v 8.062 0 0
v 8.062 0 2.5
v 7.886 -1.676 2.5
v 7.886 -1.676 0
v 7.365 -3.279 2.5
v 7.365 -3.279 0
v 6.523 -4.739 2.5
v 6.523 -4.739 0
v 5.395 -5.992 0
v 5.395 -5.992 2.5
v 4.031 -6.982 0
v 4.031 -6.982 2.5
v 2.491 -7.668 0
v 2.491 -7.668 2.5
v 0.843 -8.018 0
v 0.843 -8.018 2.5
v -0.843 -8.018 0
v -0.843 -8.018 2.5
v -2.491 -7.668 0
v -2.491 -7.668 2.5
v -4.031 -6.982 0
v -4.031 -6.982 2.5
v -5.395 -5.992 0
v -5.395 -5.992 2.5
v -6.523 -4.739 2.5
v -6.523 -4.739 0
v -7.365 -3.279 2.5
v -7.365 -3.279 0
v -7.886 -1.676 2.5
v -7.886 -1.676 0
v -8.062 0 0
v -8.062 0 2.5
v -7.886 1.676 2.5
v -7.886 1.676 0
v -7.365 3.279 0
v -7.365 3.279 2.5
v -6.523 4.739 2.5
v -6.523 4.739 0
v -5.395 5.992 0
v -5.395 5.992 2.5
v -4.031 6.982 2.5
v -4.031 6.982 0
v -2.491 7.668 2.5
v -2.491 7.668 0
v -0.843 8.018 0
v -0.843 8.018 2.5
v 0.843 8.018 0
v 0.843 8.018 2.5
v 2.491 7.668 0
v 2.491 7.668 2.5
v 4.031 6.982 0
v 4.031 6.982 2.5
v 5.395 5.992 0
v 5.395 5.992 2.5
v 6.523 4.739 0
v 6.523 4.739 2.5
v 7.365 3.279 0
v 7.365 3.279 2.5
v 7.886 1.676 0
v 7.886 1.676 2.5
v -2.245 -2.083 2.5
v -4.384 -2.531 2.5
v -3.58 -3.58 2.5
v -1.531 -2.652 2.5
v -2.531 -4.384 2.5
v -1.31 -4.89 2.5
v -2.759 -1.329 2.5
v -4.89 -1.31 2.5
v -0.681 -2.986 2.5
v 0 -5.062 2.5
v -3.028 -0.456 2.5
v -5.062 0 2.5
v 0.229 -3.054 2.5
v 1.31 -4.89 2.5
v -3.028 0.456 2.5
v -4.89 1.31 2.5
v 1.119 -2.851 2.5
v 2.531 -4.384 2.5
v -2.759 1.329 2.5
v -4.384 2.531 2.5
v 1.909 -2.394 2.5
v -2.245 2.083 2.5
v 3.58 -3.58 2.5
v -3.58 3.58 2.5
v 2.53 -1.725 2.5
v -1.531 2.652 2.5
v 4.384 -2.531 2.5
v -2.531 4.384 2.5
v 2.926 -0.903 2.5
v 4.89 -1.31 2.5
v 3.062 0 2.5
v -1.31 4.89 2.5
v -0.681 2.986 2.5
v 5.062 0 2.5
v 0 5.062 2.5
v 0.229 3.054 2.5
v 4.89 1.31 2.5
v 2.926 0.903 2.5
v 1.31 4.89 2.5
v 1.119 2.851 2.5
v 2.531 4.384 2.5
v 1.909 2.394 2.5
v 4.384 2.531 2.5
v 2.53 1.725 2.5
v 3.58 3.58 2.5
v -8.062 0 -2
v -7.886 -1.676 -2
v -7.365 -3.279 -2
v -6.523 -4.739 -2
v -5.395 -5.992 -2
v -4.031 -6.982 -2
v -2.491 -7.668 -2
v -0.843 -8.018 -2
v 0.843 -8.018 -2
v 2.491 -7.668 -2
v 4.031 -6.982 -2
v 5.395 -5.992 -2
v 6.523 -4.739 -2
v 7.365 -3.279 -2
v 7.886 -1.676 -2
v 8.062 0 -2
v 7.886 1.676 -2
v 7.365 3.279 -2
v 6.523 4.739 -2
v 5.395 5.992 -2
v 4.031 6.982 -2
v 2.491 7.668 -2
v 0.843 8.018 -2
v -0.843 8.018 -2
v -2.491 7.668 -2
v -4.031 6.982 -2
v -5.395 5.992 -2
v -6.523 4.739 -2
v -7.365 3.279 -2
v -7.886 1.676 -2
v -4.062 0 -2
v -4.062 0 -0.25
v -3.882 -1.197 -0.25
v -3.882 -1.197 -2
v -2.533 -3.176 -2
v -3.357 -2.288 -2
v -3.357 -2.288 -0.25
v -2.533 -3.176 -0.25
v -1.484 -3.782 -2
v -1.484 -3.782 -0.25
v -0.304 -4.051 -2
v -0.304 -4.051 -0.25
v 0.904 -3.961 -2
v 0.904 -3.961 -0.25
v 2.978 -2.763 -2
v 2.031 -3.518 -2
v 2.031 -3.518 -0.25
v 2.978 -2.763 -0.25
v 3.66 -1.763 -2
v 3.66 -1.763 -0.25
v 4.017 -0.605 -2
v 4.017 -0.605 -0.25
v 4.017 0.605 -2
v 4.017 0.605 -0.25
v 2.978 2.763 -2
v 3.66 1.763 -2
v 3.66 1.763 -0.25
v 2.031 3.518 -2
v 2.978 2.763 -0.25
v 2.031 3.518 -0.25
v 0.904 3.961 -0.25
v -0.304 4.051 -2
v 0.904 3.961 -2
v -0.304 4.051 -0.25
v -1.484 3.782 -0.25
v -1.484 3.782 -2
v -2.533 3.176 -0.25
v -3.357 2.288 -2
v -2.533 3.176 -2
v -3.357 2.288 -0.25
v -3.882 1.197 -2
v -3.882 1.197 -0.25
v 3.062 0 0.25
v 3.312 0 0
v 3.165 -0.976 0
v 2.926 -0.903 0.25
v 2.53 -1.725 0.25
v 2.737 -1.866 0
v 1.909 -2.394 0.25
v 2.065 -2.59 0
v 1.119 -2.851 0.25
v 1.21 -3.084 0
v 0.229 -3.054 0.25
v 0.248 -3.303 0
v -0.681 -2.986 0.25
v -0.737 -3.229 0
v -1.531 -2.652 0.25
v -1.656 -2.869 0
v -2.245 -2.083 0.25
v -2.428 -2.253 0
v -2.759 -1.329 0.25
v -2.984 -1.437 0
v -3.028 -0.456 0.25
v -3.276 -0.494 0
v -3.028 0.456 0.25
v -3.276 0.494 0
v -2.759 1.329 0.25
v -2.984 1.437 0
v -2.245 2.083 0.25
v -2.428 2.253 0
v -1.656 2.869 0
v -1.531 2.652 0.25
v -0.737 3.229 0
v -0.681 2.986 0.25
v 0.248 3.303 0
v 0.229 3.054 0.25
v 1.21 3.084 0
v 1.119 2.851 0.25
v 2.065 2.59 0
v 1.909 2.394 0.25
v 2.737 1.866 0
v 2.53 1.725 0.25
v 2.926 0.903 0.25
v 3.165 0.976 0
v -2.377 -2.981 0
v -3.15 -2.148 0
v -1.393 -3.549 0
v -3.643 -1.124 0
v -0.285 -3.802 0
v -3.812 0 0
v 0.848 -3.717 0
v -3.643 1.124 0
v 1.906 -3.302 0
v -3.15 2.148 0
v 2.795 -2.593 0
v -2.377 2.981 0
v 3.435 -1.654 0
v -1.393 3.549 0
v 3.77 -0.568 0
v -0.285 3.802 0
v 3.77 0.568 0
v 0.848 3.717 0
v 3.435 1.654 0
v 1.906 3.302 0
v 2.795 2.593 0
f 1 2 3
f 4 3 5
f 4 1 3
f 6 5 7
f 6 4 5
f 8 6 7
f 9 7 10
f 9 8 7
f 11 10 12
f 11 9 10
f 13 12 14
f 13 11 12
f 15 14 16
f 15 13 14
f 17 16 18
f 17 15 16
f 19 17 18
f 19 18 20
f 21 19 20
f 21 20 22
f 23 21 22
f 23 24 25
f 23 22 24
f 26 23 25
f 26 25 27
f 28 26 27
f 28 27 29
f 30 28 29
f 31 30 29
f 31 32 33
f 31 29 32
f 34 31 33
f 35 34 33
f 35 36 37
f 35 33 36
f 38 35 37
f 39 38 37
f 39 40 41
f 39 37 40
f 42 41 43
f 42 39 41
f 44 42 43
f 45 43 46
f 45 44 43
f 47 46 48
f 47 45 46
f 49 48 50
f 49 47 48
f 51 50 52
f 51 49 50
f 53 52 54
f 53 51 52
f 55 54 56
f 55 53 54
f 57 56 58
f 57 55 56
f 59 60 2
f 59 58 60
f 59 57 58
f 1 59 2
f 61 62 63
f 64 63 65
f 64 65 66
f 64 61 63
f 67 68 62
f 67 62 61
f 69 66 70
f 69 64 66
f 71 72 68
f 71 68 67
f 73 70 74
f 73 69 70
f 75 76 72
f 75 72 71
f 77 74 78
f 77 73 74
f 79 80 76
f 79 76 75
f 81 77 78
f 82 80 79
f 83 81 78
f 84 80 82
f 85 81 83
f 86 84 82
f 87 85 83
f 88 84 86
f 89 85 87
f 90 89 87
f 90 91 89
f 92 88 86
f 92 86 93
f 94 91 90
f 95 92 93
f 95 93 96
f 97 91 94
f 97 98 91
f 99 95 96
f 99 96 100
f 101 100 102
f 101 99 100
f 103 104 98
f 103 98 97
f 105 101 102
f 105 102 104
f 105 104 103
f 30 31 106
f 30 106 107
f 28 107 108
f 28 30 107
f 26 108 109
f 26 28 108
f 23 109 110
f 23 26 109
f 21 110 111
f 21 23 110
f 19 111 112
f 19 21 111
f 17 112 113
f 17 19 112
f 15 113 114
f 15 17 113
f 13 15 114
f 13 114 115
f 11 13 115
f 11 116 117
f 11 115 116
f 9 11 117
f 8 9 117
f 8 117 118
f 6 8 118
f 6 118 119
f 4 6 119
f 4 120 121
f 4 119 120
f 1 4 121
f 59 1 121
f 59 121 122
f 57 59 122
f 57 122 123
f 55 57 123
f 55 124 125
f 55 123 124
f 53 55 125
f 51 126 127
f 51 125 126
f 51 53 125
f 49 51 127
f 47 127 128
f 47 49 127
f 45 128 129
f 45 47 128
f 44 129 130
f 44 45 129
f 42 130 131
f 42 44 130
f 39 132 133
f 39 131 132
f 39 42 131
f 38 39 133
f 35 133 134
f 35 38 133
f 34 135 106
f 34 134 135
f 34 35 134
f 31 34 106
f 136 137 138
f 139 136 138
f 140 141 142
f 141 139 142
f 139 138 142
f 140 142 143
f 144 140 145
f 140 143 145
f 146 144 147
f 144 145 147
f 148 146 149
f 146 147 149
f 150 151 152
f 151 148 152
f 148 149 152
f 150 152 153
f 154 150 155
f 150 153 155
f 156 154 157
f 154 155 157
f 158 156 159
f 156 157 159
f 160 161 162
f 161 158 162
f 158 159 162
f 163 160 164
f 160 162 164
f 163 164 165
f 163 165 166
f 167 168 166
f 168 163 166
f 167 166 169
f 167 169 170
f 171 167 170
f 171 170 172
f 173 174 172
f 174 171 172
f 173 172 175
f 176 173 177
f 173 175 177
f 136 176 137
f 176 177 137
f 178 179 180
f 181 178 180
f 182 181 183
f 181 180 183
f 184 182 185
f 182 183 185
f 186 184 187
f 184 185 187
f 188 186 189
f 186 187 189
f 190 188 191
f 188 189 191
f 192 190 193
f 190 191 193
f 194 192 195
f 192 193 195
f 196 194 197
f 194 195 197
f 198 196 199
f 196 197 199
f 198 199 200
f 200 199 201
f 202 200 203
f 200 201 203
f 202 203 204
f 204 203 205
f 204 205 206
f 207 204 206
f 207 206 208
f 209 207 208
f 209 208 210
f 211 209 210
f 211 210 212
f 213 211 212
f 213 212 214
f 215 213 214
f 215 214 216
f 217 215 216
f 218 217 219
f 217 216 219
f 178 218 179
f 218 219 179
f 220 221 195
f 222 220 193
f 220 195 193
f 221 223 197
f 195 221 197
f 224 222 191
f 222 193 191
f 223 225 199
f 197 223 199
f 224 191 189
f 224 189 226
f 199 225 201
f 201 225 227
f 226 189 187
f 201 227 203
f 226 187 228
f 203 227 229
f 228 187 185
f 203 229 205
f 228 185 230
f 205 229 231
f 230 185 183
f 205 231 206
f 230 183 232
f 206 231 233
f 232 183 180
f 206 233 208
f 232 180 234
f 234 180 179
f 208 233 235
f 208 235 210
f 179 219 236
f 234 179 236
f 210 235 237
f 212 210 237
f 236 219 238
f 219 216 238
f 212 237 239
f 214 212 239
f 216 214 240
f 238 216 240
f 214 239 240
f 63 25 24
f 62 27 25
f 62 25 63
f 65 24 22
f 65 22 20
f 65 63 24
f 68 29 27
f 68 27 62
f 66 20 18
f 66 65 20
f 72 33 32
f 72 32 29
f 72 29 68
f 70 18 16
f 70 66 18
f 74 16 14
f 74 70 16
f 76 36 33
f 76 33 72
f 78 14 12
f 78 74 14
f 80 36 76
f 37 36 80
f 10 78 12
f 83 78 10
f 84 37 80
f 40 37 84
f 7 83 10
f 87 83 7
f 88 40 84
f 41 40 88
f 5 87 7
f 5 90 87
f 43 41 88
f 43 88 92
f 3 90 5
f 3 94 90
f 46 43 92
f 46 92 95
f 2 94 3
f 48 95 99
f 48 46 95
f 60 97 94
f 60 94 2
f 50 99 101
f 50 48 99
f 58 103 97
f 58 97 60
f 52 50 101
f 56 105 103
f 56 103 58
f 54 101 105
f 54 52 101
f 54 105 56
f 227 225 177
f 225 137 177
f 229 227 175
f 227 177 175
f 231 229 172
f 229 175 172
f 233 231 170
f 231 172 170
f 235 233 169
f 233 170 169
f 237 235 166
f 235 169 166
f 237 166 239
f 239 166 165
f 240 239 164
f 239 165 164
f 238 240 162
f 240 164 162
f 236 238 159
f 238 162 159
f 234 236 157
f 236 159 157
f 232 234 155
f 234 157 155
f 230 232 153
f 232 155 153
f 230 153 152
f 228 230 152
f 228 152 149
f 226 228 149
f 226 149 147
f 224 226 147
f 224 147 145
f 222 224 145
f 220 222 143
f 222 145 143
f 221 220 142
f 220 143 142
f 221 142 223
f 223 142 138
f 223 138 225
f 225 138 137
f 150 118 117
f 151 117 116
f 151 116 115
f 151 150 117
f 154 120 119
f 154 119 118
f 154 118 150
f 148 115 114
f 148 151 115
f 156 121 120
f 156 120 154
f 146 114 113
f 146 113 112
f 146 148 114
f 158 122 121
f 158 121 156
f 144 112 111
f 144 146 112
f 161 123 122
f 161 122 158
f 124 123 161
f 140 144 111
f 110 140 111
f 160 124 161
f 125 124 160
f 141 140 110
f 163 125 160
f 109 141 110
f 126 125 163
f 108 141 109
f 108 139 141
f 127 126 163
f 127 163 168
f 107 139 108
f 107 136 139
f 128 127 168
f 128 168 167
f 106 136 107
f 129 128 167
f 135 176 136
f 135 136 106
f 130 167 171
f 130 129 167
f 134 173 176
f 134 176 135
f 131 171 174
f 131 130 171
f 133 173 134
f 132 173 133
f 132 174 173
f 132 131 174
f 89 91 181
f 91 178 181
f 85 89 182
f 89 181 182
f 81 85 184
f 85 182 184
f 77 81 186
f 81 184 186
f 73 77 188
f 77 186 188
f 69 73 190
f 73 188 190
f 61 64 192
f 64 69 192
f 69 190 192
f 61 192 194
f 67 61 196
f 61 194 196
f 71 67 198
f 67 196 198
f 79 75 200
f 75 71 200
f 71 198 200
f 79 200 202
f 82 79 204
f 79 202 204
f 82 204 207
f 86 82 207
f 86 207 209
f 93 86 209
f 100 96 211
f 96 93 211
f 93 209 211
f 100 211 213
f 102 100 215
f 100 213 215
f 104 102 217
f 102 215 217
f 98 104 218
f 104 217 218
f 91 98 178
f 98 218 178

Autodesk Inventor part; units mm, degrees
ref_plane "YZ Plane" through (0, 0, 0) normal (1, 0, 0) x (0, 1, 0)
ref_plane "XZ Plane" through (0, 0, 0) normal (0, 1, 0) x (-1, 0, 0)
ref_plane "XY Plane" through (0, 0, 0) normal (0, 0, 1) x (1, 0, 0)
sketch "Sketch1" plane through (0, 0, 0) normal (0, 0, 1) x (1, 0, 0)
  circle A0 centre (0, 0) radius 3.0625
  circle A1 centre (0, 0) radius 5.0625
  dimension "d0" = 6.125
  dimension "d1" = 2
extrude "Extrusion1" add sketch "Sketch1" along normal blind 2.5
sketch "Sketch2" plane through (0, 0, 0) normal (0, 0, -1) x (-1, 0, 0)
  circle A0 centre (0, 0) radius 5.0625 projected
  circle A1 centre (0, 0) radius 4.0625
  circle A2 centre (0, 0) radius 8.0625
  dimension "d4" = 8.125
  dimension "d5" = 4
extrude "Extrusion2" add sketch "Sketch2" along normal blind 2 contours A0 | A2
sketch "Sketch3" plane through (0, 0, 0) normal (0, 0, 1) x (1, 0, 0)
  circle A0 centre (0, 0) radius 8.0625 projected
  circle A1 centre (0, 0) radius 5.0625 projected
extrude "Extrusion3" add sketch "Sketch3" along normal up to surface (2.5 mm away)
chamfer "Chamfer1" distance 0.25 angle 45 2 edges at (4.0625, 0, 0) (-3.0625, 0, 0)
properties part number "ArmBaseEncoderAlignmentFlange"
